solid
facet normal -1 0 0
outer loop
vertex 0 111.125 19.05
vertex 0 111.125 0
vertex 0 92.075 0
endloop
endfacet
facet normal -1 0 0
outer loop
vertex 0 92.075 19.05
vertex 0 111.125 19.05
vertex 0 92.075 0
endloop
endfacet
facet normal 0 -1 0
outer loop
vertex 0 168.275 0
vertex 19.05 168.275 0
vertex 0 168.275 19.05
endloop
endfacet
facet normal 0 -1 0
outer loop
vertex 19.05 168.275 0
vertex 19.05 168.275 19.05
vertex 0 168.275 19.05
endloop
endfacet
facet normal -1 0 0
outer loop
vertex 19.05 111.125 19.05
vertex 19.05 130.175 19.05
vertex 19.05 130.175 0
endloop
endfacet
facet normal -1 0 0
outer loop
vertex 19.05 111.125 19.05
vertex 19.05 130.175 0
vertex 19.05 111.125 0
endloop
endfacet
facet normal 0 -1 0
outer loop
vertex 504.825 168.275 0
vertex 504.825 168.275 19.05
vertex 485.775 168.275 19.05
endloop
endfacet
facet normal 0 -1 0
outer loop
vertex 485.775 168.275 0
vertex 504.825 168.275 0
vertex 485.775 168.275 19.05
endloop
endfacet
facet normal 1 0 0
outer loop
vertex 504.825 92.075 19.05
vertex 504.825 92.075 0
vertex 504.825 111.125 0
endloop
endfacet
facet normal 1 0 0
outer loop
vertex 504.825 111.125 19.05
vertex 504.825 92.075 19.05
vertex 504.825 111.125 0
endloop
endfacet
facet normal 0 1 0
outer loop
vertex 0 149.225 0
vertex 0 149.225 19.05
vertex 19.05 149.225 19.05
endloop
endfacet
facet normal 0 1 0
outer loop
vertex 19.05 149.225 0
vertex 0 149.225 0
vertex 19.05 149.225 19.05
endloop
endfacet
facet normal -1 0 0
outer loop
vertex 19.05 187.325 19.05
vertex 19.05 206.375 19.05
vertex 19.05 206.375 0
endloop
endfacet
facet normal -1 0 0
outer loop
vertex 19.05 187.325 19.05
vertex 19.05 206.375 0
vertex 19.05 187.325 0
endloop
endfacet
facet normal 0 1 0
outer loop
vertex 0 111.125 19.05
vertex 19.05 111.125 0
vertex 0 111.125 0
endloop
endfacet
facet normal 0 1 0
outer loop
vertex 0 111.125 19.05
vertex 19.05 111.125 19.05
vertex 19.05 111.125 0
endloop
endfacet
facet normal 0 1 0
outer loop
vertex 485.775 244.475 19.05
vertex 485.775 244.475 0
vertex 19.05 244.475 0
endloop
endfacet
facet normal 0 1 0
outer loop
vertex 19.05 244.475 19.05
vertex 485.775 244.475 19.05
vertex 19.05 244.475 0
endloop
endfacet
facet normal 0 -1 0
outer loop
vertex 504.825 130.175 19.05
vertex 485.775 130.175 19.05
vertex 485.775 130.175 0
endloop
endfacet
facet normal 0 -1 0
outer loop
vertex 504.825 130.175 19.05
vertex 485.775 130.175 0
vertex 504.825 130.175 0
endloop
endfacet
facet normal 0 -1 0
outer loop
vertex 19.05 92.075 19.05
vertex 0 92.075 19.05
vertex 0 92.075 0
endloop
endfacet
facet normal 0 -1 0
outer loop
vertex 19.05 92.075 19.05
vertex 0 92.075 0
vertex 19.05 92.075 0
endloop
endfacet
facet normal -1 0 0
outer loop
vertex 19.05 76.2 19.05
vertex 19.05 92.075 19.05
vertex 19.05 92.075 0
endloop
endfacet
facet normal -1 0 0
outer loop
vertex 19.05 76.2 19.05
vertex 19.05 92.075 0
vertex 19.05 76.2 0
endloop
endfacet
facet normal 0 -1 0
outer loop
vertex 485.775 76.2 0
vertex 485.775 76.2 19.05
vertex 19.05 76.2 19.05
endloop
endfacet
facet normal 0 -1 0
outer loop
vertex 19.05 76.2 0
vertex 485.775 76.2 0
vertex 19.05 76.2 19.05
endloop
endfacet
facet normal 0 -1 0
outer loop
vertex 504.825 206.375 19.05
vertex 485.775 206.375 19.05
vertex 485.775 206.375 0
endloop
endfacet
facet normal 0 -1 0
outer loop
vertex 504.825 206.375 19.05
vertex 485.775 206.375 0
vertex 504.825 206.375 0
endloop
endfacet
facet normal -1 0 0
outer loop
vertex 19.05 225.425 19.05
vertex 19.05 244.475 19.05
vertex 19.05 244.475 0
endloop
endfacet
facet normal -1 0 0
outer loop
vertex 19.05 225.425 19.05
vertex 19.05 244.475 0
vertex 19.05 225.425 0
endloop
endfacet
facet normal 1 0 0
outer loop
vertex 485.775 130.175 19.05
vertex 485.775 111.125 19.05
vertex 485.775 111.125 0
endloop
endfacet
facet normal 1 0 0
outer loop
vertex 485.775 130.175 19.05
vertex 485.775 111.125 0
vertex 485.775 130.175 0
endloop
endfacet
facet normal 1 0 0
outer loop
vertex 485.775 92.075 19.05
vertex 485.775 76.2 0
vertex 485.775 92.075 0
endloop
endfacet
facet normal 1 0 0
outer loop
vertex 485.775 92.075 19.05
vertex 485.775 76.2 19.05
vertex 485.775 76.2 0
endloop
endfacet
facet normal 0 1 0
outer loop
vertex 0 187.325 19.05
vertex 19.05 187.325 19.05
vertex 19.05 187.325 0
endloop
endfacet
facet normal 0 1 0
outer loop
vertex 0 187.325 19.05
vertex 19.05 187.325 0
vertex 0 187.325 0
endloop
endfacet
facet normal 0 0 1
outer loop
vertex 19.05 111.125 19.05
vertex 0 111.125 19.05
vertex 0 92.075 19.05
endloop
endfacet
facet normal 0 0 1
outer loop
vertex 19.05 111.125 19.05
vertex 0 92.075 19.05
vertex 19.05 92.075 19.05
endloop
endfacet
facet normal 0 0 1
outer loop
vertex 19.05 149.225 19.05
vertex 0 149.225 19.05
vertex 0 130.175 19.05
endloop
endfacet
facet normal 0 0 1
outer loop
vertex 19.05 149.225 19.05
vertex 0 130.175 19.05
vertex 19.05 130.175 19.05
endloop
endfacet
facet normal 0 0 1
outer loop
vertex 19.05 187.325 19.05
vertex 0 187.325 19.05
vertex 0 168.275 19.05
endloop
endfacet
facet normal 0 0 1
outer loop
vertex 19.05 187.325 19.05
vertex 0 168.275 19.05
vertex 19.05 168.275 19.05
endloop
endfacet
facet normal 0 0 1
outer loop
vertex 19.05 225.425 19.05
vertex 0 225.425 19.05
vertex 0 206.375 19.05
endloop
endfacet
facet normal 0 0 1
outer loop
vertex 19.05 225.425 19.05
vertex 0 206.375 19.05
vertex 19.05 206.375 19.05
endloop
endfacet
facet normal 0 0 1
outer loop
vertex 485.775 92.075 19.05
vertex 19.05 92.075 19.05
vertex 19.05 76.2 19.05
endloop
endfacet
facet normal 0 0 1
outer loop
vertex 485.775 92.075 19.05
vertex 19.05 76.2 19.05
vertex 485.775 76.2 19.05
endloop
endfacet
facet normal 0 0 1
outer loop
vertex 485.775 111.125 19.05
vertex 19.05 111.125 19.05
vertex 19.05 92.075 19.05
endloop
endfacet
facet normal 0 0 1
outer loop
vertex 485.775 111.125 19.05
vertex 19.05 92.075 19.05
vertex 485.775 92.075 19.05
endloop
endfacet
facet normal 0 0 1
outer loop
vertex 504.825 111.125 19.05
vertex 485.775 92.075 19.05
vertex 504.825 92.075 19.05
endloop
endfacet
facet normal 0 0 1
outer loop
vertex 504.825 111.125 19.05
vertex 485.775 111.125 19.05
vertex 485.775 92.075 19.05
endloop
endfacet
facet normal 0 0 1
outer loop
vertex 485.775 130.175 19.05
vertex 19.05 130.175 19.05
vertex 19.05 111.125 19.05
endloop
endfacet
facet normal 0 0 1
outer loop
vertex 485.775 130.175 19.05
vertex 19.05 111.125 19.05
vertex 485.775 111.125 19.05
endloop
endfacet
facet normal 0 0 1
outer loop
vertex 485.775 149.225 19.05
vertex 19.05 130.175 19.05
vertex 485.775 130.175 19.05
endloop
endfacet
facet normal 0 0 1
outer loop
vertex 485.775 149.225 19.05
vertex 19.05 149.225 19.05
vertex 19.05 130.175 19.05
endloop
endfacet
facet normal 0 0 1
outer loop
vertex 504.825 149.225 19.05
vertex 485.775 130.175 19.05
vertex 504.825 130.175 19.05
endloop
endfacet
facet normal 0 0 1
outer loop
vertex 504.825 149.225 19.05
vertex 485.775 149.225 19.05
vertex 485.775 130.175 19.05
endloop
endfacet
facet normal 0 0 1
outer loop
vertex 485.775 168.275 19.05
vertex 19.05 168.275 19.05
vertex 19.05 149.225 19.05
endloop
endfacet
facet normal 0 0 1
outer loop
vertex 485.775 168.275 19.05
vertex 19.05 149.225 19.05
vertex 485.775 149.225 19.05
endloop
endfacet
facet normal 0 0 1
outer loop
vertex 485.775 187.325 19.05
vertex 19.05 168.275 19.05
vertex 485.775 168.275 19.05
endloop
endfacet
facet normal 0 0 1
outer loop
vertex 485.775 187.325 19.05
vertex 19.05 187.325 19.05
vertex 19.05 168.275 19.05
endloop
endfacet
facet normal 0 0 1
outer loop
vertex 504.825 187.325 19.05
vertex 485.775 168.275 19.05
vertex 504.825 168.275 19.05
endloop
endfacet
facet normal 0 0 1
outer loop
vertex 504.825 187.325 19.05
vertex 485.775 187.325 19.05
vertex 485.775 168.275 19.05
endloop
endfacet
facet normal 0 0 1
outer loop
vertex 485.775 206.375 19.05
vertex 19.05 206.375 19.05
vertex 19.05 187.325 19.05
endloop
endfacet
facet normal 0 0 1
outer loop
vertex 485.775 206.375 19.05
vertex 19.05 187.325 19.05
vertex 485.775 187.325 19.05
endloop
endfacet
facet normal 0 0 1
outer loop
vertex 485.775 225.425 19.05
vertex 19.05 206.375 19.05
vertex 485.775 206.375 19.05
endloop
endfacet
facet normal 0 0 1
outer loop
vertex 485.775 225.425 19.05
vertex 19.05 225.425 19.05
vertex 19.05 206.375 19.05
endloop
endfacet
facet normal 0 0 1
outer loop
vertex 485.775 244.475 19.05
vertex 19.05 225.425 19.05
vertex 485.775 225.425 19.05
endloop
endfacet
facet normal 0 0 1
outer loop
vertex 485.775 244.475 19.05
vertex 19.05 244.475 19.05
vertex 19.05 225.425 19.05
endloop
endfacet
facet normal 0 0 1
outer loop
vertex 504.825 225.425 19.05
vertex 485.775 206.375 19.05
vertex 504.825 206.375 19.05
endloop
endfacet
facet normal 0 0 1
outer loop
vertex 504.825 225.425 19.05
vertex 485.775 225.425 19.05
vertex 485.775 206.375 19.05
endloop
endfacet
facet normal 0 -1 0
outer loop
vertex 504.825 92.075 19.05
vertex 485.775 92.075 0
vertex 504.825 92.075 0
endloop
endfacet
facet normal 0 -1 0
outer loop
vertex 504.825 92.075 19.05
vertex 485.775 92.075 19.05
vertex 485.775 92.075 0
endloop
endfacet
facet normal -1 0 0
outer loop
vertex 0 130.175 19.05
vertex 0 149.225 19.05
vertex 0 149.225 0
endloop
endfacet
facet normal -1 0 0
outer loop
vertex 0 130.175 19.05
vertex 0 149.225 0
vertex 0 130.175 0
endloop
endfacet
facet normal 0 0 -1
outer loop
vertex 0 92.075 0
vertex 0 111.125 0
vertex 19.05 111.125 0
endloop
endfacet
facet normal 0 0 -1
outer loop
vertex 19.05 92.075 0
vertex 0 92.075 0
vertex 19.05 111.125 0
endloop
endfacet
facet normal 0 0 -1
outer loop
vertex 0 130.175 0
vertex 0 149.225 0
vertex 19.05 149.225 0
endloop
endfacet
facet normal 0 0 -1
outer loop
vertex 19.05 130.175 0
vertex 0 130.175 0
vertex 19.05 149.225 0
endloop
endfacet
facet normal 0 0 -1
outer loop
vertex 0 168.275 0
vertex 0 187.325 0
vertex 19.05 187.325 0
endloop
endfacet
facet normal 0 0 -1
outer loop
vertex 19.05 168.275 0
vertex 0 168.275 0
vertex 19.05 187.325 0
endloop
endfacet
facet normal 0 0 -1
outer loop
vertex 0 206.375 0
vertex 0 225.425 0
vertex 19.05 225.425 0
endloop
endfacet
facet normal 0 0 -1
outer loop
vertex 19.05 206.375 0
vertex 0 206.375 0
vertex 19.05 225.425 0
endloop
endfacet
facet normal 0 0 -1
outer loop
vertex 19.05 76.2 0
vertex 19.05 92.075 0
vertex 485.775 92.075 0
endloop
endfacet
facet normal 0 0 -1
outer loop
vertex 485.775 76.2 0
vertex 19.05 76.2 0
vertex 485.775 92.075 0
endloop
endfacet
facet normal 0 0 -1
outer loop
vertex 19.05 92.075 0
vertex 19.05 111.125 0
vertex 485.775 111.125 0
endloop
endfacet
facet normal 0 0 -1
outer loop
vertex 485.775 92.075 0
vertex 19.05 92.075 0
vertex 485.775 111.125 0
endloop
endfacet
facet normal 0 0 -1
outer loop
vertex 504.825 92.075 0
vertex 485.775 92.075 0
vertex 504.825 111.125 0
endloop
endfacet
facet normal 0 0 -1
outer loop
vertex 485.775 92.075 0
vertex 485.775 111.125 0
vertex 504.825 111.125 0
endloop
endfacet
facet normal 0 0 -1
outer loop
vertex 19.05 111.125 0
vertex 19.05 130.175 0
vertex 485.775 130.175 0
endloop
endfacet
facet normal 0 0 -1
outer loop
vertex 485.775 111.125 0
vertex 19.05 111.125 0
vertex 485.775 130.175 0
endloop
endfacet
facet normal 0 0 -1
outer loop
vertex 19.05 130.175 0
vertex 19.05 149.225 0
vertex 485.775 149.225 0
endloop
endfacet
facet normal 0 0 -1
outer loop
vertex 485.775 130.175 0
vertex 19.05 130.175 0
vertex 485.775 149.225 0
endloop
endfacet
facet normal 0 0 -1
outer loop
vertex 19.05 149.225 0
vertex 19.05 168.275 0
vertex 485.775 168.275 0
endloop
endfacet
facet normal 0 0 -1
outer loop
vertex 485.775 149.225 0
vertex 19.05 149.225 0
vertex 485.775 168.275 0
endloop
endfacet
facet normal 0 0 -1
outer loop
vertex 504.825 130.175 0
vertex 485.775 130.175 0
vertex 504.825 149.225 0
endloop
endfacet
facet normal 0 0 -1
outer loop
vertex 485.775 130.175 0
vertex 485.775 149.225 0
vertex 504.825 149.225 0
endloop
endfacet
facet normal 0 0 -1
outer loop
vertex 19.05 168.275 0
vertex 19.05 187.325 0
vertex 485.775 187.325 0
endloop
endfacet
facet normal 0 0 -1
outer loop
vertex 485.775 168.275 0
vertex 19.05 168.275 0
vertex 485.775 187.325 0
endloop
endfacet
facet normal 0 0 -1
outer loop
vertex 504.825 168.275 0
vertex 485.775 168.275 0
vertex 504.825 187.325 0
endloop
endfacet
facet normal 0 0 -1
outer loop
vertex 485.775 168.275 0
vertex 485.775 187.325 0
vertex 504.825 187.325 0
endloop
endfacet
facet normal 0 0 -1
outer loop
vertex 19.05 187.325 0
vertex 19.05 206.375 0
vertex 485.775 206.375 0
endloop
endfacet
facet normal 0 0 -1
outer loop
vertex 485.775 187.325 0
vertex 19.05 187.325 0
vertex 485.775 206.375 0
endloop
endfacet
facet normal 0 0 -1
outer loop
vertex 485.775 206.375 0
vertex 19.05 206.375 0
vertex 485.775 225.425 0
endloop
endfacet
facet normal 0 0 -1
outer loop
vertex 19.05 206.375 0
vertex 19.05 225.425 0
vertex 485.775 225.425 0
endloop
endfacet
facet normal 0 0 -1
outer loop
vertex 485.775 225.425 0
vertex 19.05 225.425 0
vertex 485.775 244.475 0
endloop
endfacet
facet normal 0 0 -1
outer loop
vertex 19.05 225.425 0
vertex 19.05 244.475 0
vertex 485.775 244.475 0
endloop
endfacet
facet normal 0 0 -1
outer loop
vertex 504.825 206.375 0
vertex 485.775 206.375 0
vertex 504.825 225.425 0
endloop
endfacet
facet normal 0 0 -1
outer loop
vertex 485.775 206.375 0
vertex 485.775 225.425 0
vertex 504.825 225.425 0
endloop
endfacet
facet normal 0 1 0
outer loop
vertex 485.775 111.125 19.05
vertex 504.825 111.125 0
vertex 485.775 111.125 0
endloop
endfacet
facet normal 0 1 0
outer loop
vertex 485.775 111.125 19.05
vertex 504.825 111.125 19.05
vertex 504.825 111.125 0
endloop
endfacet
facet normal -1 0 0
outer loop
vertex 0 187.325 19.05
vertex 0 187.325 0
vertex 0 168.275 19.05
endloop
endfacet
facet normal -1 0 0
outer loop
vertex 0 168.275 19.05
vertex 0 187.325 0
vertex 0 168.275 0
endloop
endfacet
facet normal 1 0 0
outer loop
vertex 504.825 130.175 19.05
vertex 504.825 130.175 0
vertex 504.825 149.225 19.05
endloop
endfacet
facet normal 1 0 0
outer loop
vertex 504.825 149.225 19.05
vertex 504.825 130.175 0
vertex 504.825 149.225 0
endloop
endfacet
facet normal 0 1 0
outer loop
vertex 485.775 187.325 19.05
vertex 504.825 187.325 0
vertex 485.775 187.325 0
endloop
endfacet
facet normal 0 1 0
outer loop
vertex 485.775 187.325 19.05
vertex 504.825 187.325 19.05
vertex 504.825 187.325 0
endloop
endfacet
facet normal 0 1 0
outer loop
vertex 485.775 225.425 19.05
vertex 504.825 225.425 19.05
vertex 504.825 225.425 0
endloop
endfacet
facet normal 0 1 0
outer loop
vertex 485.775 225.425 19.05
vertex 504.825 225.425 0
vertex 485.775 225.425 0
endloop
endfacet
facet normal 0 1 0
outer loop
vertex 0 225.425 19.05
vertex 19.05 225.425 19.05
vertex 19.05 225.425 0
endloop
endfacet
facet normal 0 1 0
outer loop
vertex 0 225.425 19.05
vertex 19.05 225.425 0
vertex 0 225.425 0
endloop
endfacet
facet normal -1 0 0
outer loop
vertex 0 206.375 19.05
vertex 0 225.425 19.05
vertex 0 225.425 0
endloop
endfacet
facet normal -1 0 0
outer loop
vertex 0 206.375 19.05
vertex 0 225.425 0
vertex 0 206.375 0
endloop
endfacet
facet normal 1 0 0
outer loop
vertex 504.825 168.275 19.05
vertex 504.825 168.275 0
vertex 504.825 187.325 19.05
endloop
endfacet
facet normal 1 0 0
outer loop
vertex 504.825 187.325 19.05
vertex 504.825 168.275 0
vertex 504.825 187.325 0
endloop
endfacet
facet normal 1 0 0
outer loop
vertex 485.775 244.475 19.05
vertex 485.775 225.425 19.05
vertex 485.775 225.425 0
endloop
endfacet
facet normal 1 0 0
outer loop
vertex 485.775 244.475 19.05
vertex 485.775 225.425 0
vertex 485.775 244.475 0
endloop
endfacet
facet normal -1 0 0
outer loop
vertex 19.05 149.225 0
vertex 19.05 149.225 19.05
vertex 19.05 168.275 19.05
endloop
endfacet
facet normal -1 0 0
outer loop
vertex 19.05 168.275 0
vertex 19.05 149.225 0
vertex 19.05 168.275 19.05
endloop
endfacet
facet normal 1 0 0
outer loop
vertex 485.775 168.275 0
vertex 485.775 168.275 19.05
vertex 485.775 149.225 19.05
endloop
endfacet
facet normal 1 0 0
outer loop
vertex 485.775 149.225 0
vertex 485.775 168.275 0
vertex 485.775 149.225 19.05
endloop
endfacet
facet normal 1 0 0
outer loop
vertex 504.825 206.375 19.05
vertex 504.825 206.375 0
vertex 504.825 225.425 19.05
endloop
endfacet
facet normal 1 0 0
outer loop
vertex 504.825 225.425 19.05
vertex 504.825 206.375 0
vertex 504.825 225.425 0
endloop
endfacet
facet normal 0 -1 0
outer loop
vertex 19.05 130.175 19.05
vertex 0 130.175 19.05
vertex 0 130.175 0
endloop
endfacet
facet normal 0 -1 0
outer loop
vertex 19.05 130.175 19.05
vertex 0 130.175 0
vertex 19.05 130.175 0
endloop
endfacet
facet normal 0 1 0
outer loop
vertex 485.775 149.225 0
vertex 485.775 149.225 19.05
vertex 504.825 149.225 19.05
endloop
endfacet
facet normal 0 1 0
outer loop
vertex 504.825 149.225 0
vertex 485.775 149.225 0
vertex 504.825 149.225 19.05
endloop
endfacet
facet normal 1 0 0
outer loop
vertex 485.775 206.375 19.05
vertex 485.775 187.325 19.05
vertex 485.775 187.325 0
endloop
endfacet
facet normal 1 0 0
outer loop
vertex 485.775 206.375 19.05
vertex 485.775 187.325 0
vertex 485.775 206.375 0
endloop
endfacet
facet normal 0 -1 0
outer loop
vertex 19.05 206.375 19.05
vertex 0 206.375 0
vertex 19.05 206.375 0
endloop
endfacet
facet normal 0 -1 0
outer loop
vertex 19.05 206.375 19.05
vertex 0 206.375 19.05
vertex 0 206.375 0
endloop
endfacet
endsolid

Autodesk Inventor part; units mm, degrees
ref_plane "YZ Plane" through (0, 0, 0) normal (1, 0, 0) x (0, 1, 0)
ref_plane "XZ Plane" through (0, 0, 0) normal (0, 1, 0) x (-1, 0, 0)
ref_plane "XY Plane" through (0, 0, 0) normal (0, 0, 1) x (1, 0, 0)
sketch "Sketch1" plane through (0, 0, 0) normal (0, 0, 1) x (1, 0, 0)
  line L0 (0, 0) -> (252.4125, 0)
  line L1 (252.4125, 0) -> (252.4125, 244.475)
  line L2 (252.4125, 244.475) -> (0, 244.475)
  line L3 (0, 244.475) -> (0, 0)
  dimension "d0" = 252.4125
  dimension "d1" = 244.475
extrude "Extrusion1" add sketch "Sketch1" along normal blind 19.05
sketch "Sketch3" plane through (0, 0, 19.05) normal (0, 0, 1) x (1, 0, 0)
  line L0 (0, 0) -> (252.4125, 0) projected
  line L1 (252.4125, 244.475) -> (0, 244.475) projected
  line L2 (0, 244.475) -> (0, 0) projected
  line L3 (0, 244.475) -> (19.05, 244.475)
  line L4 (19.05, 244.475) -> (19.05, 225.425)
  line L5 (19.05, 225.425) -> (0, 225.425)
  line L6 (0, 225.425) -> (0, 244.475)
  line L7 (19.05, 168.275) -> (0, 168.275)
  line L8 (0, 168.275) -> (0, 149.225)
  line L9 (0, 149.225) -> (19.05, 149.225)
  line L10 (19.05, 149.225) -> (19.05, 168.275)
  line L11 (0, 130.175) -> (19.05, 130.175)
  line L12 (19.05, 130.175) -> (19.05, 111.125)
  line L13 (19.05, 111.125) -> (0, 111.125)
  line L14 (0, 111.125) -> (0, 130.175)
  line L15 (0, 206.375) -> (19.05, 206.375)
  line L16 (19.05, 206.375) -> (19.05, 187.325)
  line L17 (19.05, 187.325) -> (0, 187.325)
  line L18 (0, 187.325) -> (0, 206.375)
  line L19 (0, 92.075) -> (19.05, 92.075)
  line L20 (19.05, 92.075) -> (19.05, 73.025)
  line L21 (19.05, 73.025) -> (0, 73.025)
  line L22 (0, 73.025) -> (0, 92.075)
  line L23 (0, 53.975) -> (19.05, 53.975)
  line L24 (19.05, 53.975) -> (19.05, 34.925)
  line L25 (19.05, 34.925) -> (0, 34.925)
  line L26 (0, 34.925) -> (0, 53.975)
  line L27 (0, 15.875) -> (19.05, 15.875)
  line L28 (19.05, 15.875) -> (19.05, -3.175)
  line L29 (19.05, -3.175) -> (0, -3.175)
  line L30 (0, -3.175) -> (0, 15.875)
  dimension "d4" = 19.05
  dimension "d5" = 19.05
  dimension "d6" = 244.475
  dimension "d7" = 19.05
  dimension "d8" = 19.05
  dimension "d9" = 19.05
  dimension "d10" = 19.05
  dimension "d11" = 19.05
  dimension "d12" = 19.05
  dimension "d13" = 19.05
  dimension "d14" = 19.05
  dimension "d15" = 19.05
  dimension "d16" = 19.05
  dimension "d17" = 19.05
  dimension "d18" = 19.05
  dimension "d19" = 19.05
  dimension "d20" = 19.05
  dimension "d21" = 19.05
  dimension "d22" = 19.05
  dimension "d23" = 19.05
  dimension "d24" = 15.875
extrude "Extrusion2" cut sketch "Sketch3" against normal through all
mirror "Mirror1" about plane through (252.4125, 0, 0) normal (1, 0, 0)
sketch "Sketch6" plane through (0, 0, 19.05) normal (0, 0, 1) x (1, 0, 0)
  line L0 (19.05, 34.925) -> (0, 34.925) projected
  line L1 (0, 34.925) -> (0, 15.875) projected
  line L2 (0, 15.875) -> (19.05, 15.875) projected
  line L3 (19.05, 15.875) -> (19.05, 0) projected
  line L4 (19.05, 0) -> (485.775, 0) projected
  line L5 (485.775, 15.875) -> (485.775, 0) projected
  line L6 (504.825, 15.875) -> (485.775, 15.875) projected
  line L7 (504.825, 34.925) -> (504.825, 15.875) projected
  line L8 (485.775, 34.925) -> (504.825, 34.925) projected
  line L9 (485.775, 53.975) -> (485.775, 34.925) projected
  line L10 (504.825, 53.975) -> (485.775, 53.975) projected
  line L11 (504.825, 73.025) -> (504.825, 53.975) projected
  line L12 (485.775, 73.025) -> (504.825, 73.025) projected
  line L13 (485.775, 92.075) -> (485.775, 73.025) projected
  line L14 (19.05, 92.075) -> (19.05, 73.025) projected
  line L15 (19.05, 73.025) -> (0, 73.025) projected
  line L16 (0, 73.025) -> (0, 53.975) projected
  line L17 (0, 53.975) -> (19.05, 53.975) projected
  line L18 (19.05, 53.975) -> (19.05, 34.925) projected
  line L19 (504.825, 76.2) -> (19.05, 76.2)
  line L20 (19.05, 76.2) -> (485.775, 76.2)
  line L21 (19.05, 244.475) -> (485.775, 244.475) projected
  point P0 (0, 0)
  dimension "d54" = 168.275
extrude "Extrusion3" cut sketch "Sketch6" against normal through all
properties part number "deep_side" material "Wood (Birch)"
